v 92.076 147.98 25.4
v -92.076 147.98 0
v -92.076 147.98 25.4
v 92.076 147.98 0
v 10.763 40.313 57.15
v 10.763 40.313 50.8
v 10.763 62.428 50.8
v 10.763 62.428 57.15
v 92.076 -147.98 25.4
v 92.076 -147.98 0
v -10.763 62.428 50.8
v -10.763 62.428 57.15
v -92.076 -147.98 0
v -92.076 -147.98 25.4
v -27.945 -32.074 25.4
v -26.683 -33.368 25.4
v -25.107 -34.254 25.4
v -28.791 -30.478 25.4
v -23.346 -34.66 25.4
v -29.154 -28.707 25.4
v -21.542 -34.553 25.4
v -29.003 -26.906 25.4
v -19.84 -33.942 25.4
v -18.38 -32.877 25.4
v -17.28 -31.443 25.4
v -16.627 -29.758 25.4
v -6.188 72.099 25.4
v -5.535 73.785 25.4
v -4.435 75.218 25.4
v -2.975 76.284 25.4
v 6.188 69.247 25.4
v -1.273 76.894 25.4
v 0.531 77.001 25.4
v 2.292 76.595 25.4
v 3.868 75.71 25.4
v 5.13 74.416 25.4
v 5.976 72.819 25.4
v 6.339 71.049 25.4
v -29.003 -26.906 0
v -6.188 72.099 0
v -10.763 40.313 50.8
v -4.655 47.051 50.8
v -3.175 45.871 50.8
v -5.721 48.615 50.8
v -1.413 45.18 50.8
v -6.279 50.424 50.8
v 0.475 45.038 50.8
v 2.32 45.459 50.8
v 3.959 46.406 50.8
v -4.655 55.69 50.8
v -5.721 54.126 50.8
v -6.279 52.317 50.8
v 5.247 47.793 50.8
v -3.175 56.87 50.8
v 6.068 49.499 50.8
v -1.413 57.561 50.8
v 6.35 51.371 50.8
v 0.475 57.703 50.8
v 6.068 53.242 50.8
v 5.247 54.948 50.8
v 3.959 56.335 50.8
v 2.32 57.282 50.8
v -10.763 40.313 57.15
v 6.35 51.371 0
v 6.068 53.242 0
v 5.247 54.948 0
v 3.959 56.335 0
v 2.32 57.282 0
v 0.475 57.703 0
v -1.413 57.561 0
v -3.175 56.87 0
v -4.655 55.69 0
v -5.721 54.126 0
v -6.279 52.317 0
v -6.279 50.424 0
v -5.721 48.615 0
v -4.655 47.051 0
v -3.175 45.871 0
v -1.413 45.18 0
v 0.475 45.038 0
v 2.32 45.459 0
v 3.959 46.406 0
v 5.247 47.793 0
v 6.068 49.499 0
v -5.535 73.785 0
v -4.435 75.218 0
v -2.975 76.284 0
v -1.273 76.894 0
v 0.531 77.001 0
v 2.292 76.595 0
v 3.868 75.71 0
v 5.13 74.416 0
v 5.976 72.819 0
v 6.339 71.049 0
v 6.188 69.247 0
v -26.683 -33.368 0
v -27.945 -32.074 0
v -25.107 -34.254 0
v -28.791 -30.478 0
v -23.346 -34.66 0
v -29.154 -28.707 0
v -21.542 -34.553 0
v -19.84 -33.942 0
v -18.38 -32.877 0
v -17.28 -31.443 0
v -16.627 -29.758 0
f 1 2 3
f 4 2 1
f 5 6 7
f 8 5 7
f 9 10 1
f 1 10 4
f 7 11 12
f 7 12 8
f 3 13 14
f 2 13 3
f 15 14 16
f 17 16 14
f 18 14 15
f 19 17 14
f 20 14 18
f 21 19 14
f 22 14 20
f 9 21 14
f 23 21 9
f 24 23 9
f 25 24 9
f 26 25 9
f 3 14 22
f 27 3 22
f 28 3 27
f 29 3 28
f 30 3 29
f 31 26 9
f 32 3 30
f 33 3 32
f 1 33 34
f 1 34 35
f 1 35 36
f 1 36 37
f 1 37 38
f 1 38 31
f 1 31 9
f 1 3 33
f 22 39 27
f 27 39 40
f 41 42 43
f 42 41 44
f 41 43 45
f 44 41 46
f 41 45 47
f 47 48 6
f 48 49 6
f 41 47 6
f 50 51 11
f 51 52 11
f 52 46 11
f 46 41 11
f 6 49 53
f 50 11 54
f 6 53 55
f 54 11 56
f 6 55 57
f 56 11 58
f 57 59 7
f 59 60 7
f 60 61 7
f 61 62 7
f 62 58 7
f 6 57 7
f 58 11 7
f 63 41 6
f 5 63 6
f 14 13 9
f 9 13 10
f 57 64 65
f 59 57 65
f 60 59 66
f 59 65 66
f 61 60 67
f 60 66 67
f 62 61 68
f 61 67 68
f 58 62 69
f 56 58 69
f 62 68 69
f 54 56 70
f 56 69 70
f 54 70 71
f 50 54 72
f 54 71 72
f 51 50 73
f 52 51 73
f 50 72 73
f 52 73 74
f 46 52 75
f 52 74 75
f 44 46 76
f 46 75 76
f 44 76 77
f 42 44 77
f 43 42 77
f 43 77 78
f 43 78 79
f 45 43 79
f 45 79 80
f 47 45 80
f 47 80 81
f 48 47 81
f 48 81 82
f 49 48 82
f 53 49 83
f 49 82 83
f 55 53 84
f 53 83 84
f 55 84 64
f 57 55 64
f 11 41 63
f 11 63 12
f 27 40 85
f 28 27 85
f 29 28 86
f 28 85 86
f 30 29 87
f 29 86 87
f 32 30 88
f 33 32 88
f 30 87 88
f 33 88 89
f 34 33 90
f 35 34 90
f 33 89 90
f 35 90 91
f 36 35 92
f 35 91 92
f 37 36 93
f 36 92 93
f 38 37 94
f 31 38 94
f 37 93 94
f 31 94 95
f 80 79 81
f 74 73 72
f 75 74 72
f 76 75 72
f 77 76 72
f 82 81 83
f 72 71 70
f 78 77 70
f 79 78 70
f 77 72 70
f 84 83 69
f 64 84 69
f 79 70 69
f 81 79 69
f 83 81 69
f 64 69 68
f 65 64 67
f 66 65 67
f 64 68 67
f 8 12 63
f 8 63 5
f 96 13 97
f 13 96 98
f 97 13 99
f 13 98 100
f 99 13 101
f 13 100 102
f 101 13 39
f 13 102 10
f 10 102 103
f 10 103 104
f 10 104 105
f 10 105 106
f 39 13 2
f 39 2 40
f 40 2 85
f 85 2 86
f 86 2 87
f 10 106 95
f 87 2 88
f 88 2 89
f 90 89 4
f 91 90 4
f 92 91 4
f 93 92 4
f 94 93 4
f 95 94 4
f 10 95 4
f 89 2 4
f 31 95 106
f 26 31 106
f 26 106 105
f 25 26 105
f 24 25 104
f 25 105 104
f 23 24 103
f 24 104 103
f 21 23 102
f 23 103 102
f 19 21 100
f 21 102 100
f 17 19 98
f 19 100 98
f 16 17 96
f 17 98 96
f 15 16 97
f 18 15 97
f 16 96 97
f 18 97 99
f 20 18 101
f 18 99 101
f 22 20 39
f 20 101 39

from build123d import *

# Parameters (mm, degrees)
F0_W     = 184.151083231
F0_H     = 295.9594726562
F1_DEPTH = 25.4
F2_R     = 6.35
F3_DEPTH = 50.8
F4_W     = 21.5269681066
F4_H     = 22.1156030893
F5_DEPTH = 6.35


with BuildPart() as f1:
    # F0 (on Top) → F1 (new body)
    with BuildSketch(Plane.XY):
        Rectangle(F0_W, F0_H)
        with BuildLine():
            Line((-29.0028088444, -26.9058910199), (-6.187827205, 72.0993442599))
            ThreePointArc((-6.187827205, 72.0993442599), (1.4259363525, 76.8612351124), (6.187827205, 69.247471555))
            Line((6.187827205, 69.247471555), (-16.6271544344, -29.7577637248))
            ThreePointArc((-16.6271544344, -29.7577637248), (-24.2409179918, -34.5196545773), (-29.0028088444, -26.9058910199))
        make_face(mode=Mode.SUBTRACT)
    extrude(amount=F1_DEPTH)


with BuildPart() as f3:
    # F2 (on Top) → F3 (new body)
    with BuildSketch(Plane.XY):
        with Locations((0, 51.3705201447)):
            Circle(F2_R)
    extrude(amount=F3_DEPTH)

    # F4 (on face) → F5 (join)
    with BuildSketch(Plane.XY.offset(50.8)):
        with Locations((0, 51.3705201447)):
            Rectangle(F4_W, F4_H)
    extrude(amount=F5_DEPTH)


solid = Compound([f1.part, f3.part])
